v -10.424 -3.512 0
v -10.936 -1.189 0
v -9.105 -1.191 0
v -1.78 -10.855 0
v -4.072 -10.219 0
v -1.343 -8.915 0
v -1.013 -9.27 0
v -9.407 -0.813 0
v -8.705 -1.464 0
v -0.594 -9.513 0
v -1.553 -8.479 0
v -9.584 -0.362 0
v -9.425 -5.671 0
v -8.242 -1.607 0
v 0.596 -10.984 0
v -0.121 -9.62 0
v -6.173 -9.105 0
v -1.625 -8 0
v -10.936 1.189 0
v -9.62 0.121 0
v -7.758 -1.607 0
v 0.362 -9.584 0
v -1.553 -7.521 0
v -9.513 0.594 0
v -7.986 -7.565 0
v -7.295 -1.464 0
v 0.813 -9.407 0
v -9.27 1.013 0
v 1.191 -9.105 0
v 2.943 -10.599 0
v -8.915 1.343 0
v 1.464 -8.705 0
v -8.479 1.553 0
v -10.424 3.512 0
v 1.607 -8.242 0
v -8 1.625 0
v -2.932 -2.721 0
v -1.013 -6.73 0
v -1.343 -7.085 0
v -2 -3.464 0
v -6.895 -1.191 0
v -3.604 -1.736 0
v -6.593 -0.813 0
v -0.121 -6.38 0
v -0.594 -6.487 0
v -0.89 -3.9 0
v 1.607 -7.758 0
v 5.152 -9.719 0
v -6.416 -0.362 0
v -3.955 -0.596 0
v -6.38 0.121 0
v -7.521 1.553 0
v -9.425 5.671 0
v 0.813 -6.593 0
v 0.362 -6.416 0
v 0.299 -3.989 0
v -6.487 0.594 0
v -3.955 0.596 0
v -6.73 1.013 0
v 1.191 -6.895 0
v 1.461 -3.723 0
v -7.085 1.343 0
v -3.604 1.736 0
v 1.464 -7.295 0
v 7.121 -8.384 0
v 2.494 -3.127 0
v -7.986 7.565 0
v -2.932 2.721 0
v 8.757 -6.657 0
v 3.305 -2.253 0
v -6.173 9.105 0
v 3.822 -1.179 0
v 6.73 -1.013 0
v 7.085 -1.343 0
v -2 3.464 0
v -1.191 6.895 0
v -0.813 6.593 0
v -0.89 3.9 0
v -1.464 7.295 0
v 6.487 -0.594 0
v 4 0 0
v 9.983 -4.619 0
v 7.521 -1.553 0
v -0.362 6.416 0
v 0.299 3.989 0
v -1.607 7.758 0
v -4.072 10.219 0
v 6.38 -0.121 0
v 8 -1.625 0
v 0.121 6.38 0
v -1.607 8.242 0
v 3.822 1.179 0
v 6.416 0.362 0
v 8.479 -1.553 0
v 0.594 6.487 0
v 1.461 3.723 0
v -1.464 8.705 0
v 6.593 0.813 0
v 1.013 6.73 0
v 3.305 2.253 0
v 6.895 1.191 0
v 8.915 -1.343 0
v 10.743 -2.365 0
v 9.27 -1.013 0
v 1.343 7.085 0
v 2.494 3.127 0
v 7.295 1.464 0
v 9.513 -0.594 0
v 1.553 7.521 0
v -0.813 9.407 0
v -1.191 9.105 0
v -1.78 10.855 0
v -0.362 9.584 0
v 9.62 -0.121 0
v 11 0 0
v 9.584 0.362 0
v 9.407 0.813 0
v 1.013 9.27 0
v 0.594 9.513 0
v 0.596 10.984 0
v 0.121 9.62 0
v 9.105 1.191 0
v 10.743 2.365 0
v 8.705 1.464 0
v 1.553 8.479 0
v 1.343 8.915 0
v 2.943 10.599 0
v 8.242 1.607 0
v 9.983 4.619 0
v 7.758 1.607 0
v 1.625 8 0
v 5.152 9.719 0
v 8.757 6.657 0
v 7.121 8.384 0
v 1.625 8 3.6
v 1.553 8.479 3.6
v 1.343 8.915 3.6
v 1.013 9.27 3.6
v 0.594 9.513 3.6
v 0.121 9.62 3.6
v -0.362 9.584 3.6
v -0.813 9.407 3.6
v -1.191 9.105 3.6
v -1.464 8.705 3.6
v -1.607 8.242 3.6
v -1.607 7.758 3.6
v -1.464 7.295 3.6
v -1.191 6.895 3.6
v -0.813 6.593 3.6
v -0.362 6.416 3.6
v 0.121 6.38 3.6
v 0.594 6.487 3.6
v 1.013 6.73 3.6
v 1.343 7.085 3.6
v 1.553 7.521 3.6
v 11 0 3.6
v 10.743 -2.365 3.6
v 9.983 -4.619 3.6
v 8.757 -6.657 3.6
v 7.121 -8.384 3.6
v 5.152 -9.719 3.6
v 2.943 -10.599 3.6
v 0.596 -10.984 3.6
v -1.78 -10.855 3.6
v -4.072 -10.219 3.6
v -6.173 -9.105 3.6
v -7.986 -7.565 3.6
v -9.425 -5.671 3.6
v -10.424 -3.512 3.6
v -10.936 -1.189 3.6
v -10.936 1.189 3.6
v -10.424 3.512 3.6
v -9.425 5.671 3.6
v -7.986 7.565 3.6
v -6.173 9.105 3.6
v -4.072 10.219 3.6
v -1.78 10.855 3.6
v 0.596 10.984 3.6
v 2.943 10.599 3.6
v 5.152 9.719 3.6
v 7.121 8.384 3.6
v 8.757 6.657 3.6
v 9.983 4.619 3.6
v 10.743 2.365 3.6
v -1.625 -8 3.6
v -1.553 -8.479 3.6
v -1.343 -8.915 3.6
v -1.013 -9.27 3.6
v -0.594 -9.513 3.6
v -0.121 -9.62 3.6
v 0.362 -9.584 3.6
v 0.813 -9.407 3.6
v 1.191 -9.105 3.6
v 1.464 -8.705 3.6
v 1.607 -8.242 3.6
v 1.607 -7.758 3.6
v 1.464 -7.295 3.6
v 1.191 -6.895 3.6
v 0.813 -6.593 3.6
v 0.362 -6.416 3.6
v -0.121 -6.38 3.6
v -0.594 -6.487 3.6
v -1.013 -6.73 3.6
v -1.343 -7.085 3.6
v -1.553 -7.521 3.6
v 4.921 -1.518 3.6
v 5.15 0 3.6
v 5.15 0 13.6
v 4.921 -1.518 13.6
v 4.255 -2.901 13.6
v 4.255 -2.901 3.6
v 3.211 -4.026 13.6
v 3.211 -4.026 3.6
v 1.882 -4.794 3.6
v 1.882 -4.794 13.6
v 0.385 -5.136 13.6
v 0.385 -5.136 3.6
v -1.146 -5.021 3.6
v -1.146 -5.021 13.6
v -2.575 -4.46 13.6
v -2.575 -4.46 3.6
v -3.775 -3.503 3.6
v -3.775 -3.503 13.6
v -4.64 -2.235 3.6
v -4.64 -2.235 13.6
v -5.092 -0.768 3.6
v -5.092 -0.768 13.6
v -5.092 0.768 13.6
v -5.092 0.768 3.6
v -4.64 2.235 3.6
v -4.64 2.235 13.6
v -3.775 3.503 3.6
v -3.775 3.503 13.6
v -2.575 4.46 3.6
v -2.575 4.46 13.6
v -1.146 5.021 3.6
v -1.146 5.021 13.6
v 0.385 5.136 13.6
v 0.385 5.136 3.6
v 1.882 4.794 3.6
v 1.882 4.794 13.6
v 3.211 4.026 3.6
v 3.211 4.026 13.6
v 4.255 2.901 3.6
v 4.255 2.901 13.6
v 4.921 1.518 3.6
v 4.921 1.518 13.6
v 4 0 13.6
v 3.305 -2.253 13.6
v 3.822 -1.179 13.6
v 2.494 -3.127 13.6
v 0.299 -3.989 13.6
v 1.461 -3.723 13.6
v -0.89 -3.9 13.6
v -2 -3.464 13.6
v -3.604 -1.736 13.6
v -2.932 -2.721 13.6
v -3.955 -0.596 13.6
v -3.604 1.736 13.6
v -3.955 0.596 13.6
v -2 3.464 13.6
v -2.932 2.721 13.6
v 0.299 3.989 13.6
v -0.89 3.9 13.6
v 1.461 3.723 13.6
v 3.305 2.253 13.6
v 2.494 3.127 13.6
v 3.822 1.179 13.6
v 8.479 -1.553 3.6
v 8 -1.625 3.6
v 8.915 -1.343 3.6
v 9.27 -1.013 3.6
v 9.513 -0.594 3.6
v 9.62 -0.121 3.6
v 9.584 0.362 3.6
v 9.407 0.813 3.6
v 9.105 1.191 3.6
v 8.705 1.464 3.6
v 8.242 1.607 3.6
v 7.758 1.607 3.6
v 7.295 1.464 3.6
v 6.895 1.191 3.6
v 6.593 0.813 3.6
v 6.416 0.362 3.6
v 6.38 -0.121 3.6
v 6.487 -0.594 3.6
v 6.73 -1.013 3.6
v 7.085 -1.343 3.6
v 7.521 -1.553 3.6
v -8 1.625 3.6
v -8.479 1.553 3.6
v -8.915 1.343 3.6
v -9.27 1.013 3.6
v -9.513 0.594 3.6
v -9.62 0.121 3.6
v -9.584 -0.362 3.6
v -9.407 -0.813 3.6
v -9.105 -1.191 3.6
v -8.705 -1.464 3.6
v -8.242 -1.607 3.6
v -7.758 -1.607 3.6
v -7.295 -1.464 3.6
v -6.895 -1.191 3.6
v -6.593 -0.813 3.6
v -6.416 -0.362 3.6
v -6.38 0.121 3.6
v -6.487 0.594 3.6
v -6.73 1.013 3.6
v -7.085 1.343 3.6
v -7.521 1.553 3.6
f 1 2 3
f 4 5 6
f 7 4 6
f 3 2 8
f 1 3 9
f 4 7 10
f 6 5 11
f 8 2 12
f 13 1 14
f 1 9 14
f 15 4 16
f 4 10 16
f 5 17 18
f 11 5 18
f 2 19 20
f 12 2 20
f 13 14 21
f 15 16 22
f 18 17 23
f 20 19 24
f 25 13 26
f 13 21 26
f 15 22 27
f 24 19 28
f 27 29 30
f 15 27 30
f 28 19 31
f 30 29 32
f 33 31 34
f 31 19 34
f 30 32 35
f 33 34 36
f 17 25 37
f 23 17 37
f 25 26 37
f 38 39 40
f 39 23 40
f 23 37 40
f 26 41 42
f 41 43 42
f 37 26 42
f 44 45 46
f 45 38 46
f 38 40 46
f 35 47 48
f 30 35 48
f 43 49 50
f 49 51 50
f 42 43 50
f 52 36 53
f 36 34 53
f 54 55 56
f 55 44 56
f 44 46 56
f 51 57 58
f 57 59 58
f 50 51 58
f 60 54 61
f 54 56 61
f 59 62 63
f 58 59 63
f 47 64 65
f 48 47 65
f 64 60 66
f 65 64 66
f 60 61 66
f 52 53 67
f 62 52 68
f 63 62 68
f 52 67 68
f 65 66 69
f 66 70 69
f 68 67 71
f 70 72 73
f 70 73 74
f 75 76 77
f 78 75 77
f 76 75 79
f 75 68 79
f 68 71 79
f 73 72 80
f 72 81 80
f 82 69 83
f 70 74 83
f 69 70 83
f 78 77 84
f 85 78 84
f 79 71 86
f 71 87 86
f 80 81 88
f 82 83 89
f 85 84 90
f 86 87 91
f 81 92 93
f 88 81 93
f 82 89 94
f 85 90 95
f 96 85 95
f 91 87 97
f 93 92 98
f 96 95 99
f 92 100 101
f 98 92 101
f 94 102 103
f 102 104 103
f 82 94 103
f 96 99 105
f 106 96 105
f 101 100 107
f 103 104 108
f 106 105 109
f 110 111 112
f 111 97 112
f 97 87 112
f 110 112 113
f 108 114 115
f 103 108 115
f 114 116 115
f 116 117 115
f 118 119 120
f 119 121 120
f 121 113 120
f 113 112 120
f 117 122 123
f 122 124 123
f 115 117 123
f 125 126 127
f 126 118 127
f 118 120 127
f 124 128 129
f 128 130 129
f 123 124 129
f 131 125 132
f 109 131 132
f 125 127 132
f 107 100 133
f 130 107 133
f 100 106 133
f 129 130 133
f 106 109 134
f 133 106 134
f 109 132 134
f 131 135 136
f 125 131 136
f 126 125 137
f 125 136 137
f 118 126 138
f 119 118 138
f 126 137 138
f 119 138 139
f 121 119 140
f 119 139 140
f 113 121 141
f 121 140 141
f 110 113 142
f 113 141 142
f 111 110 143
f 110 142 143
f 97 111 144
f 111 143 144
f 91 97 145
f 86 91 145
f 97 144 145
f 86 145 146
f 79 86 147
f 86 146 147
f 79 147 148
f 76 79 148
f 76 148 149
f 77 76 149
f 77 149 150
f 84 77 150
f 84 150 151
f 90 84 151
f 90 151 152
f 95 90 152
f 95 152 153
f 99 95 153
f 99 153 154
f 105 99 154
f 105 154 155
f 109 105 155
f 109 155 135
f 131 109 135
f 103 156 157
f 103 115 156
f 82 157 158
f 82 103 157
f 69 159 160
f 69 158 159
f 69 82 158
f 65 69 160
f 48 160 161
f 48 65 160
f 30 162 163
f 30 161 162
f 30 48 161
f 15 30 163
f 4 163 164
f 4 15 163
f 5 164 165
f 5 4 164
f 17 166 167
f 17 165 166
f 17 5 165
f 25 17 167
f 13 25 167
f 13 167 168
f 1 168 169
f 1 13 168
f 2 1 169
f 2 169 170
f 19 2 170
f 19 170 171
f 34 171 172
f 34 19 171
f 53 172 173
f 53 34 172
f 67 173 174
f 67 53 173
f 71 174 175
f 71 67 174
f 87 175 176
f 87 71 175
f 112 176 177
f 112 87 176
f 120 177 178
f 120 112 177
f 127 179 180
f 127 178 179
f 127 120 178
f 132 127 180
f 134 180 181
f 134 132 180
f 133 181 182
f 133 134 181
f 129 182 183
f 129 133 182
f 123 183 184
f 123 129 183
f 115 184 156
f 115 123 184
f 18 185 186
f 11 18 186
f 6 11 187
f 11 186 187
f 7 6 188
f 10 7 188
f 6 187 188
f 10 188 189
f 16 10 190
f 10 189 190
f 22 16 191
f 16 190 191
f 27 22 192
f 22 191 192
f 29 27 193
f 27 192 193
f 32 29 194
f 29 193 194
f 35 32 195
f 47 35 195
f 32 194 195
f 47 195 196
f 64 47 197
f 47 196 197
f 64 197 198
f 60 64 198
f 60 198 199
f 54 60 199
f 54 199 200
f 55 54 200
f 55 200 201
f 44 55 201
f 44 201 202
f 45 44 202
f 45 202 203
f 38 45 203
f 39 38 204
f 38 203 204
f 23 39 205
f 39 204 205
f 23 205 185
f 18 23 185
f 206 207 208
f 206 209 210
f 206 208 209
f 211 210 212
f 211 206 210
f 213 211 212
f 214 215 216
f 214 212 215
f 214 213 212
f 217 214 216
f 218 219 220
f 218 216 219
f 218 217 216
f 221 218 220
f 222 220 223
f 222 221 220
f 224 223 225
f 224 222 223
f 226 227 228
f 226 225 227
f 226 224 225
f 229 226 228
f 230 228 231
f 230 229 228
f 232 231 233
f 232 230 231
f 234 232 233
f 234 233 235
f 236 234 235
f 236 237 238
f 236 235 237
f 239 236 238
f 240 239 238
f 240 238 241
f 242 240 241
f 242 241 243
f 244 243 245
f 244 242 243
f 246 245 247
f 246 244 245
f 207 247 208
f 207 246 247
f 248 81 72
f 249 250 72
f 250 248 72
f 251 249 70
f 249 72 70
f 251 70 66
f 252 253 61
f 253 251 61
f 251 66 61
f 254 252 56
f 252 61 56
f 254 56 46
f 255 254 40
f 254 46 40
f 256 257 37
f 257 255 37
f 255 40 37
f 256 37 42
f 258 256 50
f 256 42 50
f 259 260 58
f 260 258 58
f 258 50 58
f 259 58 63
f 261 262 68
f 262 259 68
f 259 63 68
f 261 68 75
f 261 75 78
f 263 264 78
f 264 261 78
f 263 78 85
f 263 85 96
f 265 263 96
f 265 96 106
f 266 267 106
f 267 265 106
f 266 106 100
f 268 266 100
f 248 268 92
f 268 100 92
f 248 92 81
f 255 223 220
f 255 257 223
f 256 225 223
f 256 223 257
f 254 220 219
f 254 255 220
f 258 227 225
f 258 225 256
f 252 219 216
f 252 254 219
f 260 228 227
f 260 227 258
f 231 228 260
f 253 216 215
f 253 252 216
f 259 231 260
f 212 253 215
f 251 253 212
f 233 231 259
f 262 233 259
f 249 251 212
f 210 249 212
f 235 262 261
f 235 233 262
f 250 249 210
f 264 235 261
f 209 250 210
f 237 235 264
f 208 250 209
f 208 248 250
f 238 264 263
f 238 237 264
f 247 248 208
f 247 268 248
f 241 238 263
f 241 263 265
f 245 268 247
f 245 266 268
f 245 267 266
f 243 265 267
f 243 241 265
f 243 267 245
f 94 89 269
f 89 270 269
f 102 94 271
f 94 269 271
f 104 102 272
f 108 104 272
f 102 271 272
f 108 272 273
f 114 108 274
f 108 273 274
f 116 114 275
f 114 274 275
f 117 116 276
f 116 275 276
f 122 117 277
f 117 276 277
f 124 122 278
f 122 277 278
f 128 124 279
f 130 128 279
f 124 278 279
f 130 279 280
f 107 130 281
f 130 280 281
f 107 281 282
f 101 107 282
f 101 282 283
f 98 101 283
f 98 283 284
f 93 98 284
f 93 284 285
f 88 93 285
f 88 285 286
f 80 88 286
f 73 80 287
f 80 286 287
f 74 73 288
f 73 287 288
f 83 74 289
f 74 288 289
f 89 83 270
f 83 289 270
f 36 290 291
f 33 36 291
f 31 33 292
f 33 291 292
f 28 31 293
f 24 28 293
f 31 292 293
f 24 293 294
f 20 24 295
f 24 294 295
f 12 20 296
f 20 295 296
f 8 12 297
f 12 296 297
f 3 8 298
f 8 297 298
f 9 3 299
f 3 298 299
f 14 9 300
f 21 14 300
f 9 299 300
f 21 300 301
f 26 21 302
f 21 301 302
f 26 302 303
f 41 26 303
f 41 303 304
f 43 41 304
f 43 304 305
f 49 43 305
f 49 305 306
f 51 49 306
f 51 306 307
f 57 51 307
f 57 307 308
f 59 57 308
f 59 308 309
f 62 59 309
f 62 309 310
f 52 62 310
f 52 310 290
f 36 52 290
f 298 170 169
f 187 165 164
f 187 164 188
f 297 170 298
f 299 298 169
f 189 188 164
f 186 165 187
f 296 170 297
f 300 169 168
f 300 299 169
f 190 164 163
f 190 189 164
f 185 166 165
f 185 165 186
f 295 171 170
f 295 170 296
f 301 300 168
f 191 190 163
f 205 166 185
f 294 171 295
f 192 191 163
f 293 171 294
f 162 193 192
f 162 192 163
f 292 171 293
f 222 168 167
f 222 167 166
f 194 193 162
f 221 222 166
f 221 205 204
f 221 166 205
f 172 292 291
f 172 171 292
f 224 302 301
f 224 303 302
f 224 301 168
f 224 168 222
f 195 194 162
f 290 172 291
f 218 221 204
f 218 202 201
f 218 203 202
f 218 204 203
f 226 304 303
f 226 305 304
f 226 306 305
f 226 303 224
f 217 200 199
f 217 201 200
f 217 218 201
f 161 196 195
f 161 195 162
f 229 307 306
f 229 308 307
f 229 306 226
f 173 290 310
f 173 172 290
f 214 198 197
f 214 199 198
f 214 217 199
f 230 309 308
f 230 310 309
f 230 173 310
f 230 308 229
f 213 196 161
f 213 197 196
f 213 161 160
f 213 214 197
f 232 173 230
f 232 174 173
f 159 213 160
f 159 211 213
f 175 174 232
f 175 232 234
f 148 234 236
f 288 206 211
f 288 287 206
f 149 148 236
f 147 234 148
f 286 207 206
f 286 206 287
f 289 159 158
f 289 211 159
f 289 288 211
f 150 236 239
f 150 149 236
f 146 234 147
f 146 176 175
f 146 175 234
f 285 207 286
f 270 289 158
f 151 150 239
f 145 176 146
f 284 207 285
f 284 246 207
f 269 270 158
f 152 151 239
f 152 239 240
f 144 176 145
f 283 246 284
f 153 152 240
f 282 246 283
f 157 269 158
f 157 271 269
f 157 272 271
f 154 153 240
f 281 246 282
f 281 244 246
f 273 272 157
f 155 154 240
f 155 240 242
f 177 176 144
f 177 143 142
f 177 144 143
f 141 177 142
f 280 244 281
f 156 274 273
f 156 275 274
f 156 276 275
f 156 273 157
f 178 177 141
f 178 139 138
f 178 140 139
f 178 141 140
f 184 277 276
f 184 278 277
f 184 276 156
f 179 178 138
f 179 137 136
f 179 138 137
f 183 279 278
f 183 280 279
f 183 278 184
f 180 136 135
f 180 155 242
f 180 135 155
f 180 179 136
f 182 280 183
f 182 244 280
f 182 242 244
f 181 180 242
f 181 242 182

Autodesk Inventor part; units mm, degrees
ref_plane "YZ Plane" through (0, 0, 0) normal (1, 0, 0) x (0, 1, 0)
ref_plane "XZ Plane" through (0, 0, 0) normal (0, 1, 0) x (-1, 0, 0)
ref_plane "XY Plane" through (0, 0, 0) normal (0, 0, 1) x (1, 0, 0)
sketch "Sketch1" plane through (0, 0, 0) normal (0, 0, 1) x (1, 0, 0)
  circle A0 centre (0, 0) radius 4
  circle A1 centre (0, 0) radius 11
  dimension "d0" = 8
  dimension "d1" = 22
extrude "Extrusion1" add sketch "Sketch1" along normal blind 3.6
sketch "Sketch2" plane through (0, 0, 3.6) normal (0, 0, 1) x (1, 0, 0)
  circle A0 centre (0, 0) radius 4 projected
  circle A1 centre (0, 0) radius 11 projected
  circle A2 centre (0, 0) radius 5.15
  dimension "d4" = 10.3
extrude "Extrusion2" add sketch "Sketch2" along normal blind 10 contours A2
sketch "Sketch3" plane through (0, 0, 3.6) normal (0, 0, 1) x (1, 0, 0)
  circle A0 centre (0, 0) radius 5.15 projected
  circle A1 centre (0, 0) radius 11 projected
  circle A2 centre (0, 8) radius 1.625
  dimension "d7" = 3.25
  dimension "d8" = 8
extrude "Extrusion3" cut sketch "Sketch3" against normal blind 10 contours A2
pattern_circular "Circular Pattern1" count 4 over 360 about axis through (0, 0, 3.6) along (0, 0, 1) of "Extrusion3"
properties part number "00_spindel_slide"
